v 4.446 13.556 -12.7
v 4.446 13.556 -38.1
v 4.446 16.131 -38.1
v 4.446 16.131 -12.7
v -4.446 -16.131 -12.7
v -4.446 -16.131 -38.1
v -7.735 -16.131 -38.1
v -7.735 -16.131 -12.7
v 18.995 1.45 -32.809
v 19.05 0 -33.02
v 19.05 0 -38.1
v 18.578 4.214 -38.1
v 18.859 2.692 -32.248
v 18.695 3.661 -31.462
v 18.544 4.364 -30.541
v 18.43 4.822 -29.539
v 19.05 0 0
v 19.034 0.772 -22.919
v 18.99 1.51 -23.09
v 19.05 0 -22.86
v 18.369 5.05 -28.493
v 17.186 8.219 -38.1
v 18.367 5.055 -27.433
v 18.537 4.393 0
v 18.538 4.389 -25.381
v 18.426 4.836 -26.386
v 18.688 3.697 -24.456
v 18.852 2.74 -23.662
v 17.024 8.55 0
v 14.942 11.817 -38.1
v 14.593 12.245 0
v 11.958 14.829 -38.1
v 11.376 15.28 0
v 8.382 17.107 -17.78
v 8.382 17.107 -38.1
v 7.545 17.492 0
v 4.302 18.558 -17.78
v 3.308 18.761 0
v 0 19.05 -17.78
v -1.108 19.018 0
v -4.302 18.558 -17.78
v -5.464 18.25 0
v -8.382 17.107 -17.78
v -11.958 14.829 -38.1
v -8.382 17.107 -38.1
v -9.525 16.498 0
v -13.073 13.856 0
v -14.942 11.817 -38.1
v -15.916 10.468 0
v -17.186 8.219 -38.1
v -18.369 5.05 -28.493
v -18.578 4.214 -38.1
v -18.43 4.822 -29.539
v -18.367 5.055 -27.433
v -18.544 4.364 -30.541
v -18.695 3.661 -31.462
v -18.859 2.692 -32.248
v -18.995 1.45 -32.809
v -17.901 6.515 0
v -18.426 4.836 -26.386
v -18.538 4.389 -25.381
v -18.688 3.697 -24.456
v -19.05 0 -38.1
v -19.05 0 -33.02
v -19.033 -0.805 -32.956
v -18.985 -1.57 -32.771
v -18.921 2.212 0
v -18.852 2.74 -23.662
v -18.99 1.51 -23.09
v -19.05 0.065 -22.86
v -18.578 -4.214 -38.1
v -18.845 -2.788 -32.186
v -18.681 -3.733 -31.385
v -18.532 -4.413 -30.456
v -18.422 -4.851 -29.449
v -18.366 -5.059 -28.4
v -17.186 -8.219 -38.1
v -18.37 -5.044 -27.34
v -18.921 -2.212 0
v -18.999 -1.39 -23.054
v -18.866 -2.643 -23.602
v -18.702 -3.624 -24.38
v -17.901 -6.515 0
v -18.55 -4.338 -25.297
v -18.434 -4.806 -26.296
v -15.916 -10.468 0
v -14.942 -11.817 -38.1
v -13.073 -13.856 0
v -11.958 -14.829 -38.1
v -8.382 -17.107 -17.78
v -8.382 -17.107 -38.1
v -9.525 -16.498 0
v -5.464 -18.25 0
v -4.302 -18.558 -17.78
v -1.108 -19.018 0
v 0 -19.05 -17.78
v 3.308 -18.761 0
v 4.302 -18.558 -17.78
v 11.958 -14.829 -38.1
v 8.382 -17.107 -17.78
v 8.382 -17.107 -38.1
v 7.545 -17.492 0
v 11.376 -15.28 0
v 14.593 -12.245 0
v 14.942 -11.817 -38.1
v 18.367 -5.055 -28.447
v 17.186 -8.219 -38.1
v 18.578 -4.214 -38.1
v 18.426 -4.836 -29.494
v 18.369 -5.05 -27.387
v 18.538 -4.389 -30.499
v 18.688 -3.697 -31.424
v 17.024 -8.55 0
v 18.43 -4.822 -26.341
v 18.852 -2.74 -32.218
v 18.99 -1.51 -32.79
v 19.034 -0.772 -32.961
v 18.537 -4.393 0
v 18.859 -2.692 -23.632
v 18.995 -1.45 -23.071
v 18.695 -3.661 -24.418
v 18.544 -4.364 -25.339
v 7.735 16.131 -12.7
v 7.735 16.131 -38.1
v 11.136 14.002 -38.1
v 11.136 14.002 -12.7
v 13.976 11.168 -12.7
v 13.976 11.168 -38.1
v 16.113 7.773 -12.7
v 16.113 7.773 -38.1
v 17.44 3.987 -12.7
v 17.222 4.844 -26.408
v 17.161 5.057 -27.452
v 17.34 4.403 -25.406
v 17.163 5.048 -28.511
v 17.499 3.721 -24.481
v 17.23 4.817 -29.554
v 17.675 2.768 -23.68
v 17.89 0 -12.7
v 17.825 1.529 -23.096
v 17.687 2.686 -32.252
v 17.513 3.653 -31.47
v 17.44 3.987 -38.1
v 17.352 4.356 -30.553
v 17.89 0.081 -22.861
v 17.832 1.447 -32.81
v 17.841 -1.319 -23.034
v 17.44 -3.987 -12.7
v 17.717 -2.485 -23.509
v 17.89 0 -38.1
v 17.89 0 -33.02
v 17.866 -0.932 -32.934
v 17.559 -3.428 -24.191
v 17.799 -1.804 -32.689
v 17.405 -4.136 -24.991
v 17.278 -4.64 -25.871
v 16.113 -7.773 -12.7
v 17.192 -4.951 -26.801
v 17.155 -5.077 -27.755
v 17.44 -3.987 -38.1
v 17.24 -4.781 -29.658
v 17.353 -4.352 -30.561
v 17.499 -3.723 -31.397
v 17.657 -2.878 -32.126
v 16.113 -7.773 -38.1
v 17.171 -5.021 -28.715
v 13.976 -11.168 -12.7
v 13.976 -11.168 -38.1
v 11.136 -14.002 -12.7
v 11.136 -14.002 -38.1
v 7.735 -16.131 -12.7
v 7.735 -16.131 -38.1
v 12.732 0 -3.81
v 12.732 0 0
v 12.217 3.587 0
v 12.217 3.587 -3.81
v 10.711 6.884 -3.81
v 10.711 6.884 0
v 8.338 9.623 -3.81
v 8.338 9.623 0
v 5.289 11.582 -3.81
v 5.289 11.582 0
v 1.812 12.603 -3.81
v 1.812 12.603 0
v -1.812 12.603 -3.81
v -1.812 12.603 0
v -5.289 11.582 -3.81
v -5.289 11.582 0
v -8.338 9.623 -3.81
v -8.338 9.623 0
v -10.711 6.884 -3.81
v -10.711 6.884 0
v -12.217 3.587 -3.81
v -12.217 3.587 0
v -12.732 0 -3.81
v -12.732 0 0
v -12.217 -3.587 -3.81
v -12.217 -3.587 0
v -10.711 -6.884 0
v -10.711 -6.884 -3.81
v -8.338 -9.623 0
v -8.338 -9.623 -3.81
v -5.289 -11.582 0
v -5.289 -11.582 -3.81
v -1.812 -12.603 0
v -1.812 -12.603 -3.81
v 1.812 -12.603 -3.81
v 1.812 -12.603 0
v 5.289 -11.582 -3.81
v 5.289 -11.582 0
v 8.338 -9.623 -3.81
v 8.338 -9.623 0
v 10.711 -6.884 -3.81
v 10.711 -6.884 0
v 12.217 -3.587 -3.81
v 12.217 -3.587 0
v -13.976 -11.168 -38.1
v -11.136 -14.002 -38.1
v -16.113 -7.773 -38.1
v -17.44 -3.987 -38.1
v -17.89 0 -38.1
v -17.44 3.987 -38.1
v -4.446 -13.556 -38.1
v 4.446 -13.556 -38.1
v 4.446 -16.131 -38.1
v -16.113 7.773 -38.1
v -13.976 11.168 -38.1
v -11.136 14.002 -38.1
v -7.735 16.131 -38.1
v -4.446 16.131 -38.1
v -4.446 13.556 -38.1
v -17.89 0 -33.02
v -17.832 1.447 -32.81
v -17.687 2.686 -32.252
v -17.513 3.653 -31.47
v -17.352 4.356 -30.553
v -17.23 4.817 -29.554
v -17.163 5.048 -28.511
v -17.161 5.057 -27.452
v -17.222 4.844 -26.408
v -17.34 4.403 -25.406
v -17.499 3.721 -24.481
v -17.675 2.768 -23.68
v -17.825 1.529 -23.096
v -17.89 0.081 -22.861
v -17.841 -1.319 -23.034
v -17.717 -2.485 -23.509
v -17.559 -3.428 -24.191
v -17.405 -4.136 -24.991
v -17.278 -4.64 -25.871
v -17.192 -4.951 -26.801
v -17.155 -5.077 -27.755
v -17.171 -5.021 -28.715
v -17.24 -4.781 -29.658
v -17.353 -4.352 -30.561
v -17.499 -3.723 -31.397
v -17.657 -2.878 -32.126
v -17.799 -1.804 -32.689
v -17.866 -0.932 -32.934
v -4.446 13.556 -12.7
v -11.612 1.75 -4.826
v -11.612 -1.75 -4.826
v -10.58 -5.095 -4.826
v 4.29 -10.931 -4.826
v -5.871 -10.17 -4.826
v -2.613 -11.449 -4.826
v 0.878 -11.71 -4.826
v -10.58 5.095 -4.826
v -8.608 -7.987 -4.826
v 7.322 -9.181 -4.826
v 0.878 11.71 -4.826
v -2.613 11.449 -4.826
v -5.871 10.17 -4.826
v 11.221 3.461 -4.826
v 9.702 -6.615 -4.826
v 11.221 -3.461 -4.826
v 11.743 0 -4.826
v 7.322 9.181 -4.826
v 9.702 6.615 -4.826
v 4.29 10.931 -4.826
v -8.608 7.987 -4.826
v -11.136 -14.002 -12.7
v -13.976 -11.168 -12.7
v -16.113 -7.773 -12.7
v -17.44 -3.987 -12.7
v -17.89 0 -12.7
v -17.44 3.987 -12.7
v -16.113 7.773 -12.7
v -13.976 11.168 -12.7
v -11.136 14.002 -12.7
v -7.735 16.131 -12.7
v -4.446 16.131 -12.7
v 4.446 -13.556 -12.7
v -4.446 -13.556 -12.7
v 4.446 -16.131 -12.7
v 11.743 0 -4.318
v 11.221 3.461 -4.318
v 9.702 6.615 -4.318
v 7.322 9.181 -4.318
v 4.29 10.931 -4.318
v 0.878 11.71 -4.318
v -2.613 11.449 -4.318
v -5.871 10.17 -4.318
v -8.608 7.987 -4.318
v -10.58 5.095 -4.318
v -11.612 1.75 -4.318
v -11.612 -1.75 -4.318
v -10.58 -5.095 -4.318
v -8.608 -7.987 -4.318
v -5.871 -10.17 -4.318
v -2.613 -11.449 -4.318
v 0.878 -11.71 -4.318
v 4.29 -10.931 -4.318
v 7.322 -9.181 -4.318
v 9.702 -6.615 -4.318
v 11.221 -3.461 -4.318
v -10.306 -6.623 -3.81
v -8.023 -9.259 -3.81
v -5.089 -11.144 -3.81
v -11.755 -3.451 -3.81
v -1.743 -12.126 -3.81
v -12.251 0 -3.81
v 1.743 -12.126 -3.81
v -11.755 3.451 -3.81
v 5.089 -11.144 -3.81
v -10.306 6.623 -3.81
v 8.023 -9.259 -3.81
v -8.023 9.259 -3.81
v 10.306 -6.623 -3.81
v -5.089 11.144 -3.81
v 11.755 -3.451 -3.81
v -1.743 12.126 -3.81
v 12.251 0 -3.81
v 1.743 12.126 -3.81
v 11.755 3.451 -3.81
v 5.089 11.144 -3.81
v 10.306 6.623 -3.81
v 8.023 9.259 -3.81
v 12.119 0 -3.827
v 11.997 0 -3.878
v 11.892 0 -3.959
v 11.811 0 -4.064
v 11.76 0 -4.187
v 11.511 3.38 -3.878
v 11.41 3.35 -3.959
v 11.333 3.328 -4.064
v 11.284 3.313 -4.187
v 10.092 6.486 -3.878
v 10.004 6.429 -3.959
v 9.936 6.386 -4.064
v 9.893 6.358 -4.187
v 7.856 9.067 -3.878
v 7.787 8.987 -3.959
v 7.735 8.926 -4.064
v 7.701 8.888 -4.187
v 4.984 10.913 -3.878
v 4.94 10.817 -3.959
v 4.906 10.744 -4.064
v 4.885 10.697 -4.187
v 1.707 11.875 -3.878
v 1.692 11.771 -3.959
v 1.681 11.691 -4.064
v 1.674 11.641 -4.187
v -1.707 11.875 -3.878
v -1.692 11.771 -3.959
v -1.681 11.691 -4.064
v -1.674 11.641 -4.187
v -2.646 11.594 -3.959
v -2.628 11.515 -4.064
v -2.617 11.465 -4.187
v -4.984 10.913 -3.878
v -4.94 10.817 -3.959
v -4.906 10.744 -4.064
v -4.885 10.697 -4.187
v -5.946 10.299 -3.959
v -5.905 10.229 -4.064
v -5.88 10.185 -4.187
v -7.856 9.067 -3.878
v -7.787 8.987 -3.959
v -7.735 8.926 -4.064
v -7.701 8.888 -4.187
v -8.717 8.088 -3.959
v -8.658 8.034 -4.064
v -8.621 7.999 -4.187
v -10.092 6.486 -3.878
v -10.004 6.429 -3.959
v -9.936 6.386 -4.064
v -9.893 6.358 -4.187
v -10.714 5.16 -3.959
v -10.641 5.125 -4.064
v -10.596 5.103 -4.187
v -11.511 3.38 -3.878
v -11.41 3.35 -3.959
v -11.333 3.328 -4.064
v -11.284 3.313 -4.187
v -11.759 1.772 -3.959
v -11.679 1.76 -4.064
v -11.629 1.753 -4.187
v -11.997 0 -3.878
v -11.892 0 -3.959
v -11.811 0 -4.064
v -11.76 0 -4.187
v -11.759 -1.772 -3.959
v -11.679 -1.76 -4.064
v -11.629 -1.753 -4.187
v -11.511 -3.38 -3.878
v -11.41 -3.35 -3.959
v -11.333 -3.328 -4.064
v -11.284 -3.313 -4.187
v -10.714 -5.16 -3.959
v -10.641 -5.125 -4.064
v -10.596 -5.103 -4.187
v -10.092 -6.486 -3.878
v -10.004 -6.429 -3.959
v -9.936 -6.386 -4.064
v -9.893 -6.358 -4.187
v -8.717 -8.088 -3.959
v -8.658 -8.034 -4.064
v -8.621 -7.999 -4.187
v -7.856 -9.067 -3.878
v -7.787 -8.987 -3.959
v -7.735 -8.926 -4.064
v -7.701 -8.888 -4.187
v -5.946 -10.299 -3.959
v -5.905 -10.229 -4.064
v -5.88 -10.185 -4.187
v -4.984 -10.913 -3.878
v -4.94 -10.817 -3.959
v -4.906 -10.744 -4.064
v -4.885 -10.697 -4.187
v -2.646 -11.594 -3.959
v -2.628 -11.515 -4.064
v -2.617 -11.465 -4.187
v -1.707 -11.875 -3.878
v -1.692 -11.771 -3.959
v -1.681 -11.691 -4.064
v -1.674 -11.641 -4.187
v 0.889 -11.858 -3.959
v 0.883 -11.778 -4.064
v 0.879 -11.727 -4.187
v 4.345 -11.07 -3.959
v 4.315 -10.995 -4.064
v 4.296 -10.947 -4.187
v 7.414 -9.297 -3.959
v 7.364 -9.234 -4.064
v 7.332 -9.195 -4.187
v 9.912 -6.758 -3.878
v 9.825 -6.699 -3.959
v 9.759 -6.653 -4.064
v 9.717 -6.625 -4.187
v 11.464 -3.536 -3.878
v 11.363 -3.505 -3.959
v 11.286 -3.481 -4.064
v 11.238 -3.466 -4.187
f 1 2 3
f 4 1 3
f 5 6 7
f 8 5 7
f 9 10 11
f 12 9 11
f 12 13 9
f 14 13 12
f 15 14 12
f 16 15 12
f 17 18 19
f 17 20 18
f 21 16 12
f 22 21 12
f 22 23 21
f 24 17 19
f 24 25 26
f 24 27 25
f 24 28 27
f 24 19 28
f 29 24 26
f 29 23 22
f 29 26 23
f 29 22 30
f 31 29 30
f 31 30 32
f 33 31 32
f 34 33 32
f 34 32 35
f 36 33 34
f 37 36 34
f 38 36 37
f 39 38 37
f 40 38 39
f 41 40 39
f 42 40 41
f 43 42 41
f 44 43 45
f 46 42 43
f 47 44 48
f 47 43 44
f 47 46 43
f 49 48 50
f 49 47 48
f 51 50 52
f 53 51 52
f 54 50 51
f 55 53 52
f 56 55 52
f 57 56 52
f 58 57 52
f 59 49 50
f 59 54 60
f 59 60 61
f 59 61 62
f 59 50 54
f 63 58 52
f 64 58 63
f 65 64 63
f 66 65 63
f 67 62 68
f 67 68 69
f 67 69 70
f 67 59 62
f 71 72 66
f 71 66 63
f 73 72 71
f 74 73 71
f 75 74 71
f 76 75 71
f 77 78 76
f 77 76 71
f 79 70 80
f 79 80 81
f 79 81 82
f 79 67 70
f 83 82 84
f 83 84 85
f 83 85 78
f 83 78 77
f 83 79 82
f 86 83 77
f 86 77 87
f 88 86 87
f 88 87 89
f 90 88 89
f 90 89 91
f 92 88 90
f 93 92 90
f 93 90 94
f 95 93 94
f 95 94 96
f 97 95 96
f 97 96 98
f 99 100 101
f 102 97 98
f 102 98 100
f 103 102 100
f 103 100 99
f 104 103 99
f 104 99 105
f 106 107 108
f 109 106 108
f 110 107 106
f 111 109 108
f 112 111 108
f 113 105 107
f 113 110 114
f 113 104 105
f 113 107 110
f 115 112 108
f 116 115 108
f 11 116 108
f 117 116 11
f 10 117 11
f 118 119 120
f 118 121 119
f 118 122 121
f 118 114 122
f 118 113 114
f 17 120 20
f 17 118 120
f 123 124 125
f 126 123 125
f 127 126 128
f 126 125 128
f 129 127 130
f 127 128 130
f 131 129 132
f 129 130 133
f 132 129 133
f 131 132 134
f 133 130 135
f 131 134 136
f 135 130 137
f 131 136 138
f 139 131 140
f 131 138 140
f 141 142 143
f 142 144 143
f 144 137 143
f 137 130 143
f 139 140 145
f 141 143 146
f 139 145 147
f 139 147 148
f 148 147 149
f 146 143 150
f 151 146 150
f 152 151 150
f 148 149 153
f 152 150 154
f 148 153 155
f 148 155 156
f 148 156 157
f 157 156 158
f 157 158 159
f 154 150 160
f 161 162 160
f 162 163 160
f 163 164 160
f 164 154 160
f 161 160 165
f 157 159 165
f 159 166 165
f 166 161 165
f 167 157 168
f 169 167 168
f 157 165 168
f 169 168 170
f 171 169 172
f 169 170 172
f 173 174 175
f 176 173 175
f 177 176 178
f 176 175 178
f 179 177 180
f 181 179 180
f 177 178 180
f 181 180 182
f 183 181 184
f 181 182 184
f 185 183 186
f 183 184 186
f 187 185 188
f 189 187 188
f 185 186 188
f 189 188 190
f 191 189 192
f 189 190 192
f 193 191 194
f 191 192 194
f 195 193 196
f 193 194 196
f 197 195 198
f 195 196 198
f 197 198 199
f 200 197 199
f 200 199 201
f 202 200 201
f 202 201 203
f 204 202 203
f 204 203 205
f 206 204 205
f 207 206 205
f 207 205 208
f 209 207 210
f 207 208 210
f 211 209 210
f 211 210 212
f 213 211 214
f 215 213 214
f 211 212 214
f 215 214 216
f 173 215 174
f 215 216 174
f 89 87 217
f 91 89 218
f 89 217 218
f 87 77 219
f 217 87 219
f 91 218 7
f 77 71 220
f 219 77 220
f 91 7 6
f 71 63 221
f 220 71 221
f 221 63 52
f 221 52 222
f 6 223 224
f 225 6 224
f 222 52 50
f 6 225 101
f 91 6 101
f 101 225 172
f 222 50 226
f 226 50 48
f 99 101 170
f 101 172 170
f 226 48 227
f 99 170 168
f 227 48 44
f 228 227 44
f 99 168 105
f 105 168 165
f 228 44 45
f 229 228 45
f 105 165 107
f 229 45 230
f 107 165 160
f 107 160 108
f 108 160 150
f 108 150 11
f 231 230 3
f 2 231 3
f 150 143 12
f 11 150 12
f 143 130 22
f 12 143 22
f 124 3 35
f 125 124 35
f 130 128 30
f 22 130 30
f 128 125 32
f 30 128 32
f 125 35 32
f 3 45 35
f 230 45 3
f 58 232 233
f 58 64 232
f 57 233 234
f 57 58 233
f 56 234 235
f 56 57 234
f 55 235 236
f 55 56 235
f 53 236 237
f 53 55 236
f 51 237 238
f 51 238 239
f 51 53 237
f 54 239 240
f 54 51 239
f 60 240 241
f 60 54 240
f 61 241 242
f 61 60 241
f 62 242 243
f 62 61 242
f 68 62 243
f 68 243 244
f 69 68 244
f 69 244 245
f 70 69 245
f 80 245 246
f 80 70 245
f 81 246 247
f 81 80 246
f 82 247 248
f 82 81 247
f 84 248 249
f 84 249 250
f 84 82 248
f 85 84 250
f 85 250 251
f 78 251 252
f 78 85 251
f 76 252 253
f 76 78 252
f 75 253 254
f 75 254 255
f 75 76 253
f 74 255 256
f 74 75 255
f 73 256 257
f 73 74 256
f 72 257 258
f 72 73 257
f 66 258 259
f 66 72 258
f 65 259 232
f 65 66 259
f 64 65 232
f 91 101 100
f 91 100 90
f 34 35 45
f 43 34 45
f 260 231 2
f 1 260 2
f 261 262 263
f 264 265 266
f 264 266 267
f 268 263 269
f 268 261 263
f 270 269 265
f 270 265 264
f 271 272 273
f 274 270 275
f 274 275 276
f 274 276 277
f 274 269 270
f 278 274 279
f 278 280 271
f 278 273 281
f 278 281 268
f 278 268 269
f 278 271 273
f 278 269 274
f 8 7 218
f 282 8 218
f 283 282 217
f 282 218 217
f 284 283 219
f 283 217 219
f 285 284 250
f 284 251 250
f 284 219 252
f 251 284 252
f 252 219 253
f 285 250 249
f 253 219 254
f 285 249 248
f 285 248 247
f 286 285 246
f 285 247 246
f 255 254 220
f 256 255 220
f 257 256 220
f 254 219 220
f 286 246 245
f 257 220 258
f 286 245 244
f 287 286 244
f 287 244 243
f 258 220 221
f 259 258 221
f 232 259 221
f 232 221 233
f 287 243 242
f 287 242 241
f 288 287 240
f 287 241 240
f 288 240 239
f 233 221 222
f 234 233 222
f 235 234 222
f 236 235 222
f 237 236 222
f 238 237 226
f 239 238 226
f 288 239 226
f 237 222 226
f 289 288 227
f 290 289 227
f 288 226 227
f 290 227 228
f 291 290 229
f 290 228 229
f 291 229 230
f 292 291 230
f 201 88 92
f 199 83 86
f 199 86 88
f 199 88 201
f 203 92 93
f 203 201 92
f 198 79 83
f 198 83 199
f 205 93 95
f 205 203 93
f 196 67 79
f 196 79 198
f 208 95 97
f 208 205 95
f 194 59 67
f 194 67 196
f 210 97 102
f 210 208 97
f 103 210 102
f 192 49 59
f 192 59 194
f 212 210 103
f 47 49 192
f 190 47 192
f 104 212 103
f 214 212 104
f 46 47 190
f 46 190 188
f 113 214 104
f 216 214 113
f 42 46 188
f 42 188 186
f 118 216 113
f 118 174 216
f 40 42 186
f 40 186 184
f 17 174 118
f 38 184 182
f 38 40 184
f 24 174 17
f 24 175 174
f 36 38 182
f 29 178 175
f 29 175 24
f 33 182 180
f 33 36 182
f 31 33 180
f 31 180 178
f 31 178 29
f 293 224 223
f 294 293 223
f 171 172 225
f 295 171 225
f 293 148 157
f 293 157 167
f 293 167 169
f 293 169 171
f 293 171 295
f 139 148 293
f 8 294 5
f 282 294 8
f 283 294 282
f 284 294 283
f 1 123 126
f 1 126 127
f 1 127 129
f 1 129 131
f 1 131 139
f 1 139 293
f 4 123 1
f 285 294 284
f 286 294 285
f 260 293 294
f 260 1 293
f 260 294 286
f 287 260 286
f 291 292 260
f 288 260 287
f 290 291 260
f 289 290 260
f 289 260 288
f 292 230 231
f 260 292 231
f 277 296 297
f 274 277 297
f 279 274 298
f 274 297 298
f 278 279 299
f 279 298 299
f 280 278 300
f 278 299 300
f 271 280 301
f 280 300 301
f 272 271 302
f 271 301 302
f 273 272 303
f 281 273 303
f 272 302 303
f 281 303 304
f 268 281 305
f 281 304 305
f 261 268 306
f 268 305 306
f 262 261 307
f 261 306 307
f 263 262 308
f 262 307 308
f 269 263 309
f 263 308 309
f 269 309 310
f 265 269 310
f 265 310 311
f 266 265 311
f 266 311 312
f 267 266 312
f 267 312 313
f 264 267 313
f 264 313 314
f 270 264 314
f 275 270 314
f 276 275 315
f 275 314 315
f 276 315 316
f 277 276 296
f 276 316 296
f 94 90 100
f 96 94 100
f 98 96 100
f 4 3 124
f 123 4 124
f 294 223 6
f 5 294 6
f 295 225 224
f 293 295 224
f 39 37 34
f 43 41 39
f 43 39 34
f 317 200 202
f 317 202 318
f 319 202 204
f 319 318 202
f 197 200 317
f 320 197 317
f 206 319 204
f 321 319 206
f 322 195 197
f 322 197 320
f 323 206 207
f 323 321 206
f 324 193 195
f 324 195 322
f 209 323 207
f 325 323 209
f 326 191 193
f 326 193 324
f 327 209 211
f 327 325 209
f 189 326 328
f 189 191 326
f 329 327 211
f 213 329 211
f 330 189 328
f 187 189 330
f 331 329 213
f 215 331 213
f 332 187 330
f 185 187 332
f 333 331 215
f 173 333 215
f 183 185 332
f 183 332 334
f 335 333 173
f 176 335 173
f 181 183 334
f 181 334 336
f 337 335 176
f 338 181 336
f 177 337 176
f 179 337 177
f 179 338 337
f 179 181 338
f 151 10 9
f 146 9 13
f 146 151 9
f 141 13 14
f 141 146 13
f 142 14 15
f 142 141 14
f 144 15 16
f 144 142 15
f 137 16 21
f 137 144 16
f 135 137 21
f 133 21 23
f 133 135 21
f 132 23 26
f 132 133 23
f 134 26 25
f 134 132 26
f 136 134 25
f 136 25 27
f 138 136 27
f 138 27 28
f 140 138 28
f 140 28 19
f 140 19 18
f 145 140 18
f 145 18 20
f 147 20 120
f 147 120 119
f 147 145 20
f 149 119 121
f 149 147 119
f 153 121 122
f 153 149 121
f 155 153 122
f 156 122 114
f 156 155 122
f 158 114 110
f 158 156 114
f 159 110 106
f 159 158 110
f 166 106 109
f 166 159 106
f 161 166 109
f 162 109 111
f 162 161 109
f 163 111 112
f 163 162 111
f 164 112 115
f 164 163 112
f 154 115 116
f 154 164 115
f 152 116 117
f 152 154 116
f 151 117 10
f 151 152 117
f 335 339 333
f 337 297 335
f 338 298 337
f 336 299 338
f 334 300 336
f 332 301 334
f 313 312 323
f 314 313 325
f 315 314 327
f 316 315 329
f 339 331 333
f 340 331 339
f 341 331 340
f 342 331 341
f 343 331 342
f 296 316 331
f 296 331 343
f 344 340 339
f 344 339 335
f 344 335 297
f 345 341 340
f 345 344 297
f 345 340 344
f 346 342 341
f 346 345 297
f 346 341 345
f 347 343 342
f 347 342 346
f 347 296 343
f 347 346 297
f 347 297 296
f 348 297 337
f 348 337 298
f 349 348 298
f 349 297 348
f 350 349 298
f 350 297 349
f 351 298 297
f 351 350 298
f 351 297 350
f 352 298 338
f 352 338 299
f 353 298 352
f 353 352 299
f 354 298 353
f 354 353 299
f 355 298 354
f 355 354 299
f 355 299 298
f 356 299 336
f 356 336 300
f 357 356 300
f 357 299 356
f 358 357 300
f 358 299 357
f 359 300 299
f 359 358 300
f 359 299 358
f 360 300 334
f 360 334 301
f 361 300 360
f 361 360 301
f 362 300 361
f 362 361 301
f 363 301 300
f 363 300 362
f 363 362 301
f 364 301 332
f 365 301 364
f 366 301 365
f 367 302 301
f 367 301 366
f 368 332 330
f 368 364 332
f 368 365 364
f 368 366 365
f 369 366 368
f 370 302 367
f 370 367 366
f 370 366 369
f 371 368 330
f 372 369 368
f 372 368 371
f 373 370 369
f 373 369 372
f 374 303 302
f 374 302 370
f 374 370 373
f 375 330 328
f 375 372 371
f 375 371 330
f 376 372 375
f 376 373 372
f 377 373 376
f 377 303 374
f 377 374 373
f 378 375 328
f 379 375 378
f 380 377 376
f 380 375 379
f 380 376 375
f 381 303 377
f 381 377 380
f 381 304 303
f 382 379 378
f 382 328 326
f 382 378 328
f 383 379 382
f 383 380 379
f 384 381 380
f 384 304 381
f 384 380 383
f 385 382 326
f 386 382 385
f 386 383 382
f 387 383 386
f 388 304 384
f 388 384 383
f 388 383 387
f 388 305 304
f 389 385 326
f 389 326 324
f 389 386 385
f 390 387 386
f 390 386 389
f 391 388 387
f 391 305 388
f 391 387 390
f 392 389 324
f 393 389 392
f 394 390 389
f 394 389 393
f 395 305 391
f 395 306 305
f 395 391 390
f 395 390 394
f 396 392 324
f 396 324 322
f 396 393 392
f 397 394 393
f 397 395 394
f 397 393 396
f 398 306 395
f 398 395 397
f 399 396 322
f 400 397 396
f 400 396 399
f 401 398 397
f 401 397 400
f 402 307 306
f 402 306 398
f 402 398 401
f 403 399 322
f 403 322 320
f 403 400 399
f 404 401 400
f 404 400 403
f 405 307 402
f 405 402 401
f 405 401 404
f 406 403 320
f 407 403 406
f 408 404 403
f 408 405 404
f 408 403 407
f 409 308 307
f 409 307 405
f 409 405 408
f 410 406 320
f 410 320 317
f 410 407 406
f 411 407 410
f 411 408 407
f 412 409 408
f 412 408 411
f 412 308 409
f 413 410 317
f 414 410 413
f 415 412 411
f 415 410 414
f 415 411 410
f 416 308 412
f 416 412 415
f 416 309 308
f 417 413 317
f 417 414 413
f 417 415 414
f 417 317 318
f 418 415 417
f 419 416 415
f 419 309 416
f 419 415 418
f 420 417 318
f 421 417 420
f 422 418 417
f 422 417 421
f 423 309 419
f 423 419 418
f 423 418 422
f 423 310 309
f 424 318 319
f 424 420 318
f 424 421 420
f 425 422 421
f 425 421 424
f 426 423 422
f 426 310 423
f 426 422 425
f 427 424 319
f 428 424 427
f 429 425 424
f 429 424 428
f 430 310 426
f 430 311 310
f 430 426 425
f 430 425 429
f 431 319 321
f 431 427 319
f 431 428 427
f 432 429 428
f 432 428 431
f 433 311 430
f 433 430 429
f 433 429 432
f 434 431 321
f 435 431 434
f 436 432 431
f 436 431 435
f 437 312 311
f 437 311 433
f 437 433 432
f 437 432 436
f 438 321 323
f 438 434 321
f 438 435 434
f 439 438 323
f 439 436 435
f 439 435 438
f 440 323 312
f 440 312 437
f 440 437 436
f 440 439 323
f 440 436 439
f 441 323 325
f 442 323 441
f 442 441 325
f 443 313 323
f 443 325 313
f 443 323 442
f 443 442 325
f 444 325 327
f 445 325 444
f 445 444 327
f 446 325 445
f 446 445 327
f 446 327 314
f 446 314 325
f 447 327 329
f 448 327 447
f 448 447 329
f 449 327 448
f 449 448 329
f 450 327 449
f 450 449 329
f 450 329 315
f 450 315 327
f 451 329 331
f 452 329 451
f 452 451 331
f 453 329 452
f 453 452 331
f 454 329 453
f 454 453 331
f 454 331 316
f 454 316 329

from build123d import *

# Parameters (mm, degrees)
SKETCH3_R               = 19.05
BOSS_EXTRUDE1_DEPTH     = 38.1
CUT_EXTRUDE2_DEPTH      = 25.4
CUT_EXTRUDE4_DEPTH      = 20.32
SKETCH11_R              = 12.732490025
CUT_EXTRUDE5_DEPTH      = 3.81
SKETCH12_R              = 11.742927305
CUT_EXTRUDE6_DEPTH      = 1.016
FILLET2_R               = 0.508
CUT_EXTRUDE7_DEPTH      = 47.6627796
CUT_EXTRUDE7_DEPTH_BACK = 47.6627796
SKETCH14_R              = 5.08


with BuildPart() as part:
    # Sketch3 → Boss-Extrude1 (new body)
    with BuildSketch(Plane.XY):
        Circle(SKETCH3_R)
    extrude(amount=-BOSS_EXTRUDE1_DEPTH)

    # Sketch6 → Cut-Extrude2 (cut)
    with BuildSketch(Plane(origin=(0, 0, -38.1), x_dir=(-1, 0, 0), z_dir=(0, 0, -1))):
        with BuildLine():
            Line((4.445692932, 13.555581222), (-4.445692932, 13.555581222))
            Line((-4.445692932, 13.555581222), (-4.445692932, 16.13135994))
            Line((-4.445692932, 16.13135994), (-7.735378966, 16.13135994))
            ThreePointArc((-7.735378966, 16.13135994), (-17.89013307, 0), (-7.735378966, -16.13135994))
            Line((-7.735378966, -16.13135994), (-4.445692932, -16.13135994))
            Line((-4.445692932, -16.13135994), (-4.445692932, -13.555581222))
            Line((-4.445692932, -13.555581222), (4.445692932, -13.555581222))
            Line((4.445692932, -13.555581222), (4.445692932, -16.13135994))
            Line((4.445692932, -16.13135994), (7.735378966, -16.13135994))
            ThreePointArc((7.735378966, -16.13135994), (17.89013307, 0), (7.735378966, 16.13135994))
            Line((7.735378966, 16.13135994), (4.445692932, 16.13135994))
            Line((4.445692932, 16.13135994), (4.445692932, 13.555581222))
        make_face()
    extrude(amount=-CUT_EXTRUDE2_DEPTH, mode=Mode.SUBTRACT)

    # Sketch10 → Cut-Extrude4 (cut)
    with BuildSketch(Plane(origin=(0, 0, -38.1), x_dir=(-1, 0, 0), z_dir=(0, 0, -1))):
        with BuildLine():
            Line((-8.382, 17.106857572), (8.382, 17.106857572))
            ThreePointArc((8.382, 17.106857572), (0, 19.054089968), (-8.382, 17.106857572))
        make_face()
        with BuildLine():
            Line((-8.382, -17.106857572), (8.382, -17.106857572))
            ThreePointArc((8.382, -17.106857572), (0, -19.054089968), (-8.382, -17.106857572))
        make_face()
    extrude(amount=-CUT_EXTRUDE4_DEPTH, mode=Mode.SUBTRACT)

    # Sketch11 → Cut-Extrude5 (cut)
    with BuildSketch(Plane.XY):
        Circle(SKETCH11_R)
    extrude(amount=-CUT_EXTRUDE5_DEPTH, mode=Mode.SUBTRACT)

    # Sketch12 → Cut-Extrude6 (cut)
    with BuildSketch(Plane.XY.offset(-3.81)):
        Circle(SKETCH12_R)
    extrude(amount=-CUT_EXTRUDE6_DEPTH, mode=Mode.SUBTRACT)

    # Fillet2
    fillet2_edges = [part.edges().sort_by_distance(p)[0] for p in [
        (-11.742927305, 0, -3.81),
    ]]
    fillet(fillet2_edges, radius=FILLET2_R)

    # Sketch14 → Cut-Extrude7 (cut, two sides: drawn at the far end of the back side and taken through both)
    with BuildSketch(Plane(origin=(0, 0, 0), x_dir=(0, 0, -1), z_dir=(1, 0, 0)).offset(-CUT_EXTRUDE7_DEPTH_BACK)):
        with Locations((27.94, 0)):
            Circle(SKETCH14_R)
    extrude(amount=CUT_EXTRUDE7_DEPTH + CUT_EXTRUDE7_DEPTH_BACK, mode=Mode.SUBTRACT)


solid = part.part
